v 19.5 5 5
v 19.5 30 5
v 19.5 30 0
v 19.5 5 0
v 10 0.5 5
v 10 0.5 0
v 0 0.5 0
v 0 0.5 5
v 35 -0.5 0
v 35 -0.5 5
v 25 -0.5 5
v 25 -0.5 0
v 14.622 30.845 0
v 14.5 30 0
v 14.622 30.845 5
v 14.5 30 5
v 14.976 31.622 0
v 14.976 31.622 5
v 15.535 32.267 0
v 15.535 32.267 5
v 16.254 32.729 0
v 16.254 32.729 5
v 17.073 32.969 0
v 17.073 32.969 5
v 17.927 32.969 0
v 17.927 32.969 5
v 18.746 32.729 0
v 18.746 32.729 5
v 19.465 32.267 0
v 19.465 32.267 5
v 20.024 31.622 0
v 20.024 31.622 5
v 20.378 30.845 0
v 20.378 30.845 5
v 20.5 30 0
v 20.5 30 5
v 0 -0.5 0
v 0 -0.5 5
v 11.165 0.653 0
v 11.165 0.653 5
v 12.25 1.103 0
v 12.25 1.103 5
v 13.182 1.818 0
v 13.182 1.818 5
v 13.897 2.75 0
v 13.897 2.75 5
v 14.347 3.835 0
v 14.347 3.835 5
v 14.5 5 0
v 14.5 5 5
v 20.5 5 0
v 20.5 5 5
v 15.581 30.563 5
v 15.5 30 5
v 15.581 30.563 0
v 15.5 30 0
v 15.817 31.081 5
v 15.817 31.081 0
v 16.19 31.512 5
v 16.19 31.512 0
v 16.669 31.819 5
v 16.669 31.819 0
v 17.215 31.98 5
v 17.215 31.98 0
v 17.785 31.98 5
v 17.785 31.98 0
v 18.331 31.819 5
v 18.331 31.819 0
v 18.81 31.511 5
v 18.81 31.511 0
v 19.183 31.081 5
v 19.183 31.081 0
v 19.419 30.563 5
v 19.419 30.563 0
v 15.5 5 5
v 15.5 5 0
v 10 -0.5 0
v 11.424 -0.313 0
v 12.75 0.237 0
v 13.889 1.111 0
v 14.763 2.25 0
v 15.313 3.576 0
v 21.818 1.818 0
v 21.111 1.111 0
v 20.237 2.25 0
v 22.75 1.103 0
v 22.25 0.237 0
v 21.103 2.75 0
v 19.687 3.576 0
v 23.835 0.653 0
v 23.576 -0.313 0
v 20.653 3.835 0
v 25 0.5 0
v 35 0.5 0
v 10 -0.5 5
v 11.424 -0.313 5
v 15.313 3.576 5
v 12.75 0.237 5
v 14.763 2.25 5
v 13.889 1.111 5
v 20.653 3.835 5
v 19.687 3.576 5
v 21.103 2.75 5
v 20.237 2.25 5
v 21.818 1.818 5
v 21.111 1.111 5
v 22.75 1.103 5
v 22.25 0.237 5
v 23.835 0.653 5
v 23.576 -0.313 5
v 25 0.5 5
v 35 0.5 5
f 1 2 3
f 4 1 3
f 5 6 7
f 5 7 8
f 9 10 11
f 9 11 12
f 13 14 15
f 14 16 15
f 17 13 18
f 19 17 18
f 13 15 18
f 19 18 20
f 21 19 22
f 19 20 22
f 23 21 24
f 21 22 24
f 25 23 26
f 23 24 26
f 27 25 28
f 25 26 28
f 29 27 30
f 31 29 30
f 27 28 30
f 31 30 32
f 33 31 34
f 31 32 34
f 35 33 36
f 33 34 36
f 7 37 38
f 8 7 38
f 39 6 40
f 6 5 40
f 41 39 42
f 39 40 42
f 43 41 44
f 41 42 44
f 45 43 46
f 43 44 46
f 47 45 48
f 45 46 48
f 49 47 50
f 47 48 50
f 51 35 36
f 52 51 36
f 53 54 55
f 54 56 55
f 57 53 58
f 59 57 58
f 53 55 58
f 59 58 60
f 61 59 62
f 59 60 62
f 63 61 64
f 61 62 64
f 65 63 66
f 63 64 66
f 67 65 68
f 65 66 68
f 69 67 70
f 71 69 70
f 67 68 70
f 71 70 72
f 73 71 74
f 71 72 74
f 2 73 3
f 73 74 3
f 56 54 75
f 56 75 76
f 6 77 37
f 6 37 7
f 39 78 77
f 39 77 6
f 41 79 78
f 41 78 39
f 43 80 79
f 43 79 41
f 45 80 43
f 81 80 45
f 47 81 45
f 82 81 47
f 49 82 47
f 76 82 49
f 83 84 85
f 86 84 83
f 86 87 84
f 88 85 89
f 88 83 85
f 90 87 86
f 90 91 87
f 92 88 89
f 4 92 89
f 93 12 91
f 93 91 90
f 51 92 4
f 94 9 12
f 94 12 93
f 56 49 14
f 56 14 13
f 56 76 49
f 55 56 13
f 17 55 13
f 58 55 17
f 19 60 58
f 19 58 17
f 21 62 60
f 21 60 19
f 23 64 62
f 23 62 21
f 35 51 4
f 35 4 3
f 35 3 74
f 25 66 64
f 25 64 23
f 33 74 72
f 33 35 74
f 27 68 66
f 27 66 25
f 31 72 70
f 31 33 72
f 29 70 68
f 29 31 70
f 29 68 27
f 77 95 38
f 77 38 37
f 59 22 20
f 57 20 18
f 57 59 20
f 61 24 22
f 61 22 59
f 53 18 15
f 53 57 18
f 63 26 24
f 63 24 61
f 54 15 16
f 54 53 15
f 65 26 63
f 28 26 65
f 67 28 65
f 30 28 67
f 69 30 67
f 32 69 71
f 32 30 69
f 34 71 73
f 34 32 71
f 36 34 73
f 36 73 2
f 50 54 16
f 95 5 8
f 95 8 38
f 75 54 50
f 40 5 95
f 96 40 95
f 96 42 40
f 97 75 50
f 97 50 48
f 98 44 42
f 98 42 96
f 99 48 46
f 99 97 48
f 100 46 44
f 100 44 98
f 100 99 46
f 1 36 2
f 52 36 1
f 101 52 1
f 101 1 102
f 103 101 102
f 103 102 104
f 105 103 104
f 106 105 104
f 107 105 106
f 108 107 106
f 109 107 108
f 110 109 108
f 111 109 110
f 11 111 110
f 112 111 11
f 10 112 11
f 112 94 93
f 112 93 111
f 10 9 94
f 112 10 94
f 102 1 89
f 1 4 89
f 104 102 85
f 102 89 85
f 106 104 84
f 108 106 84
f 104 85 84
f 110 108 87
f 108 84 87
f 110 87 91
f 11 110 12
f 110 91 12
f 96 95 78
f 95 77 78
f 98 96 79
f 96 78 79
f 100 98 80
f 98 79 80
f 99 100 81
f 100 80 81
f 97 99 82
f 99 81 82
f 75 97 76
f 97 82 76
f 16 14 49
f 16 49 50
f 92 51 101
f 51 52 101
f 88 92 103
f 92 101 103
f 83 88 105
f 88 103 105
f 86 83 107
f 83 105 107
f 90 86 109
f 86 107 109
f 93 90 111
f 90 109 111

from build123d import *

# Parameters (mm, degrees)
SKETCH_W = 1
SKETCH_H = 5


with BuildPart() as part:
    # AdditivePipe: sweep along a path in Sketch001
    with BuildLine(Plane.XY) as additivepipe_path:
        Line((0, 0), (10, 0))
        ThreePointArc((10, 0), (13.535525, 1.464457), (15, 4.999975))
        Line((15, 4.999975), (15, 30.000013))
        ThreePointArc((15, 30.000013), (17.500007, 32.5), (20, 29.999999))
        Line((20, 29.999999), (20, 5.000002))
        ThreePointArc((20, 5.000002), (21.464465, 1.464467), (25, 0))
        Line((25, 0), (35, 0))
    # Sketch → AdditivePipe (sweep)
    with BuildSketch(Plane.YZ):
        with Locations((0, 2.5)):
            Rectangle(SKETCH_W, SKETCH_H)
    sweep(path=additivepipe_path.line)


solid = part.part
